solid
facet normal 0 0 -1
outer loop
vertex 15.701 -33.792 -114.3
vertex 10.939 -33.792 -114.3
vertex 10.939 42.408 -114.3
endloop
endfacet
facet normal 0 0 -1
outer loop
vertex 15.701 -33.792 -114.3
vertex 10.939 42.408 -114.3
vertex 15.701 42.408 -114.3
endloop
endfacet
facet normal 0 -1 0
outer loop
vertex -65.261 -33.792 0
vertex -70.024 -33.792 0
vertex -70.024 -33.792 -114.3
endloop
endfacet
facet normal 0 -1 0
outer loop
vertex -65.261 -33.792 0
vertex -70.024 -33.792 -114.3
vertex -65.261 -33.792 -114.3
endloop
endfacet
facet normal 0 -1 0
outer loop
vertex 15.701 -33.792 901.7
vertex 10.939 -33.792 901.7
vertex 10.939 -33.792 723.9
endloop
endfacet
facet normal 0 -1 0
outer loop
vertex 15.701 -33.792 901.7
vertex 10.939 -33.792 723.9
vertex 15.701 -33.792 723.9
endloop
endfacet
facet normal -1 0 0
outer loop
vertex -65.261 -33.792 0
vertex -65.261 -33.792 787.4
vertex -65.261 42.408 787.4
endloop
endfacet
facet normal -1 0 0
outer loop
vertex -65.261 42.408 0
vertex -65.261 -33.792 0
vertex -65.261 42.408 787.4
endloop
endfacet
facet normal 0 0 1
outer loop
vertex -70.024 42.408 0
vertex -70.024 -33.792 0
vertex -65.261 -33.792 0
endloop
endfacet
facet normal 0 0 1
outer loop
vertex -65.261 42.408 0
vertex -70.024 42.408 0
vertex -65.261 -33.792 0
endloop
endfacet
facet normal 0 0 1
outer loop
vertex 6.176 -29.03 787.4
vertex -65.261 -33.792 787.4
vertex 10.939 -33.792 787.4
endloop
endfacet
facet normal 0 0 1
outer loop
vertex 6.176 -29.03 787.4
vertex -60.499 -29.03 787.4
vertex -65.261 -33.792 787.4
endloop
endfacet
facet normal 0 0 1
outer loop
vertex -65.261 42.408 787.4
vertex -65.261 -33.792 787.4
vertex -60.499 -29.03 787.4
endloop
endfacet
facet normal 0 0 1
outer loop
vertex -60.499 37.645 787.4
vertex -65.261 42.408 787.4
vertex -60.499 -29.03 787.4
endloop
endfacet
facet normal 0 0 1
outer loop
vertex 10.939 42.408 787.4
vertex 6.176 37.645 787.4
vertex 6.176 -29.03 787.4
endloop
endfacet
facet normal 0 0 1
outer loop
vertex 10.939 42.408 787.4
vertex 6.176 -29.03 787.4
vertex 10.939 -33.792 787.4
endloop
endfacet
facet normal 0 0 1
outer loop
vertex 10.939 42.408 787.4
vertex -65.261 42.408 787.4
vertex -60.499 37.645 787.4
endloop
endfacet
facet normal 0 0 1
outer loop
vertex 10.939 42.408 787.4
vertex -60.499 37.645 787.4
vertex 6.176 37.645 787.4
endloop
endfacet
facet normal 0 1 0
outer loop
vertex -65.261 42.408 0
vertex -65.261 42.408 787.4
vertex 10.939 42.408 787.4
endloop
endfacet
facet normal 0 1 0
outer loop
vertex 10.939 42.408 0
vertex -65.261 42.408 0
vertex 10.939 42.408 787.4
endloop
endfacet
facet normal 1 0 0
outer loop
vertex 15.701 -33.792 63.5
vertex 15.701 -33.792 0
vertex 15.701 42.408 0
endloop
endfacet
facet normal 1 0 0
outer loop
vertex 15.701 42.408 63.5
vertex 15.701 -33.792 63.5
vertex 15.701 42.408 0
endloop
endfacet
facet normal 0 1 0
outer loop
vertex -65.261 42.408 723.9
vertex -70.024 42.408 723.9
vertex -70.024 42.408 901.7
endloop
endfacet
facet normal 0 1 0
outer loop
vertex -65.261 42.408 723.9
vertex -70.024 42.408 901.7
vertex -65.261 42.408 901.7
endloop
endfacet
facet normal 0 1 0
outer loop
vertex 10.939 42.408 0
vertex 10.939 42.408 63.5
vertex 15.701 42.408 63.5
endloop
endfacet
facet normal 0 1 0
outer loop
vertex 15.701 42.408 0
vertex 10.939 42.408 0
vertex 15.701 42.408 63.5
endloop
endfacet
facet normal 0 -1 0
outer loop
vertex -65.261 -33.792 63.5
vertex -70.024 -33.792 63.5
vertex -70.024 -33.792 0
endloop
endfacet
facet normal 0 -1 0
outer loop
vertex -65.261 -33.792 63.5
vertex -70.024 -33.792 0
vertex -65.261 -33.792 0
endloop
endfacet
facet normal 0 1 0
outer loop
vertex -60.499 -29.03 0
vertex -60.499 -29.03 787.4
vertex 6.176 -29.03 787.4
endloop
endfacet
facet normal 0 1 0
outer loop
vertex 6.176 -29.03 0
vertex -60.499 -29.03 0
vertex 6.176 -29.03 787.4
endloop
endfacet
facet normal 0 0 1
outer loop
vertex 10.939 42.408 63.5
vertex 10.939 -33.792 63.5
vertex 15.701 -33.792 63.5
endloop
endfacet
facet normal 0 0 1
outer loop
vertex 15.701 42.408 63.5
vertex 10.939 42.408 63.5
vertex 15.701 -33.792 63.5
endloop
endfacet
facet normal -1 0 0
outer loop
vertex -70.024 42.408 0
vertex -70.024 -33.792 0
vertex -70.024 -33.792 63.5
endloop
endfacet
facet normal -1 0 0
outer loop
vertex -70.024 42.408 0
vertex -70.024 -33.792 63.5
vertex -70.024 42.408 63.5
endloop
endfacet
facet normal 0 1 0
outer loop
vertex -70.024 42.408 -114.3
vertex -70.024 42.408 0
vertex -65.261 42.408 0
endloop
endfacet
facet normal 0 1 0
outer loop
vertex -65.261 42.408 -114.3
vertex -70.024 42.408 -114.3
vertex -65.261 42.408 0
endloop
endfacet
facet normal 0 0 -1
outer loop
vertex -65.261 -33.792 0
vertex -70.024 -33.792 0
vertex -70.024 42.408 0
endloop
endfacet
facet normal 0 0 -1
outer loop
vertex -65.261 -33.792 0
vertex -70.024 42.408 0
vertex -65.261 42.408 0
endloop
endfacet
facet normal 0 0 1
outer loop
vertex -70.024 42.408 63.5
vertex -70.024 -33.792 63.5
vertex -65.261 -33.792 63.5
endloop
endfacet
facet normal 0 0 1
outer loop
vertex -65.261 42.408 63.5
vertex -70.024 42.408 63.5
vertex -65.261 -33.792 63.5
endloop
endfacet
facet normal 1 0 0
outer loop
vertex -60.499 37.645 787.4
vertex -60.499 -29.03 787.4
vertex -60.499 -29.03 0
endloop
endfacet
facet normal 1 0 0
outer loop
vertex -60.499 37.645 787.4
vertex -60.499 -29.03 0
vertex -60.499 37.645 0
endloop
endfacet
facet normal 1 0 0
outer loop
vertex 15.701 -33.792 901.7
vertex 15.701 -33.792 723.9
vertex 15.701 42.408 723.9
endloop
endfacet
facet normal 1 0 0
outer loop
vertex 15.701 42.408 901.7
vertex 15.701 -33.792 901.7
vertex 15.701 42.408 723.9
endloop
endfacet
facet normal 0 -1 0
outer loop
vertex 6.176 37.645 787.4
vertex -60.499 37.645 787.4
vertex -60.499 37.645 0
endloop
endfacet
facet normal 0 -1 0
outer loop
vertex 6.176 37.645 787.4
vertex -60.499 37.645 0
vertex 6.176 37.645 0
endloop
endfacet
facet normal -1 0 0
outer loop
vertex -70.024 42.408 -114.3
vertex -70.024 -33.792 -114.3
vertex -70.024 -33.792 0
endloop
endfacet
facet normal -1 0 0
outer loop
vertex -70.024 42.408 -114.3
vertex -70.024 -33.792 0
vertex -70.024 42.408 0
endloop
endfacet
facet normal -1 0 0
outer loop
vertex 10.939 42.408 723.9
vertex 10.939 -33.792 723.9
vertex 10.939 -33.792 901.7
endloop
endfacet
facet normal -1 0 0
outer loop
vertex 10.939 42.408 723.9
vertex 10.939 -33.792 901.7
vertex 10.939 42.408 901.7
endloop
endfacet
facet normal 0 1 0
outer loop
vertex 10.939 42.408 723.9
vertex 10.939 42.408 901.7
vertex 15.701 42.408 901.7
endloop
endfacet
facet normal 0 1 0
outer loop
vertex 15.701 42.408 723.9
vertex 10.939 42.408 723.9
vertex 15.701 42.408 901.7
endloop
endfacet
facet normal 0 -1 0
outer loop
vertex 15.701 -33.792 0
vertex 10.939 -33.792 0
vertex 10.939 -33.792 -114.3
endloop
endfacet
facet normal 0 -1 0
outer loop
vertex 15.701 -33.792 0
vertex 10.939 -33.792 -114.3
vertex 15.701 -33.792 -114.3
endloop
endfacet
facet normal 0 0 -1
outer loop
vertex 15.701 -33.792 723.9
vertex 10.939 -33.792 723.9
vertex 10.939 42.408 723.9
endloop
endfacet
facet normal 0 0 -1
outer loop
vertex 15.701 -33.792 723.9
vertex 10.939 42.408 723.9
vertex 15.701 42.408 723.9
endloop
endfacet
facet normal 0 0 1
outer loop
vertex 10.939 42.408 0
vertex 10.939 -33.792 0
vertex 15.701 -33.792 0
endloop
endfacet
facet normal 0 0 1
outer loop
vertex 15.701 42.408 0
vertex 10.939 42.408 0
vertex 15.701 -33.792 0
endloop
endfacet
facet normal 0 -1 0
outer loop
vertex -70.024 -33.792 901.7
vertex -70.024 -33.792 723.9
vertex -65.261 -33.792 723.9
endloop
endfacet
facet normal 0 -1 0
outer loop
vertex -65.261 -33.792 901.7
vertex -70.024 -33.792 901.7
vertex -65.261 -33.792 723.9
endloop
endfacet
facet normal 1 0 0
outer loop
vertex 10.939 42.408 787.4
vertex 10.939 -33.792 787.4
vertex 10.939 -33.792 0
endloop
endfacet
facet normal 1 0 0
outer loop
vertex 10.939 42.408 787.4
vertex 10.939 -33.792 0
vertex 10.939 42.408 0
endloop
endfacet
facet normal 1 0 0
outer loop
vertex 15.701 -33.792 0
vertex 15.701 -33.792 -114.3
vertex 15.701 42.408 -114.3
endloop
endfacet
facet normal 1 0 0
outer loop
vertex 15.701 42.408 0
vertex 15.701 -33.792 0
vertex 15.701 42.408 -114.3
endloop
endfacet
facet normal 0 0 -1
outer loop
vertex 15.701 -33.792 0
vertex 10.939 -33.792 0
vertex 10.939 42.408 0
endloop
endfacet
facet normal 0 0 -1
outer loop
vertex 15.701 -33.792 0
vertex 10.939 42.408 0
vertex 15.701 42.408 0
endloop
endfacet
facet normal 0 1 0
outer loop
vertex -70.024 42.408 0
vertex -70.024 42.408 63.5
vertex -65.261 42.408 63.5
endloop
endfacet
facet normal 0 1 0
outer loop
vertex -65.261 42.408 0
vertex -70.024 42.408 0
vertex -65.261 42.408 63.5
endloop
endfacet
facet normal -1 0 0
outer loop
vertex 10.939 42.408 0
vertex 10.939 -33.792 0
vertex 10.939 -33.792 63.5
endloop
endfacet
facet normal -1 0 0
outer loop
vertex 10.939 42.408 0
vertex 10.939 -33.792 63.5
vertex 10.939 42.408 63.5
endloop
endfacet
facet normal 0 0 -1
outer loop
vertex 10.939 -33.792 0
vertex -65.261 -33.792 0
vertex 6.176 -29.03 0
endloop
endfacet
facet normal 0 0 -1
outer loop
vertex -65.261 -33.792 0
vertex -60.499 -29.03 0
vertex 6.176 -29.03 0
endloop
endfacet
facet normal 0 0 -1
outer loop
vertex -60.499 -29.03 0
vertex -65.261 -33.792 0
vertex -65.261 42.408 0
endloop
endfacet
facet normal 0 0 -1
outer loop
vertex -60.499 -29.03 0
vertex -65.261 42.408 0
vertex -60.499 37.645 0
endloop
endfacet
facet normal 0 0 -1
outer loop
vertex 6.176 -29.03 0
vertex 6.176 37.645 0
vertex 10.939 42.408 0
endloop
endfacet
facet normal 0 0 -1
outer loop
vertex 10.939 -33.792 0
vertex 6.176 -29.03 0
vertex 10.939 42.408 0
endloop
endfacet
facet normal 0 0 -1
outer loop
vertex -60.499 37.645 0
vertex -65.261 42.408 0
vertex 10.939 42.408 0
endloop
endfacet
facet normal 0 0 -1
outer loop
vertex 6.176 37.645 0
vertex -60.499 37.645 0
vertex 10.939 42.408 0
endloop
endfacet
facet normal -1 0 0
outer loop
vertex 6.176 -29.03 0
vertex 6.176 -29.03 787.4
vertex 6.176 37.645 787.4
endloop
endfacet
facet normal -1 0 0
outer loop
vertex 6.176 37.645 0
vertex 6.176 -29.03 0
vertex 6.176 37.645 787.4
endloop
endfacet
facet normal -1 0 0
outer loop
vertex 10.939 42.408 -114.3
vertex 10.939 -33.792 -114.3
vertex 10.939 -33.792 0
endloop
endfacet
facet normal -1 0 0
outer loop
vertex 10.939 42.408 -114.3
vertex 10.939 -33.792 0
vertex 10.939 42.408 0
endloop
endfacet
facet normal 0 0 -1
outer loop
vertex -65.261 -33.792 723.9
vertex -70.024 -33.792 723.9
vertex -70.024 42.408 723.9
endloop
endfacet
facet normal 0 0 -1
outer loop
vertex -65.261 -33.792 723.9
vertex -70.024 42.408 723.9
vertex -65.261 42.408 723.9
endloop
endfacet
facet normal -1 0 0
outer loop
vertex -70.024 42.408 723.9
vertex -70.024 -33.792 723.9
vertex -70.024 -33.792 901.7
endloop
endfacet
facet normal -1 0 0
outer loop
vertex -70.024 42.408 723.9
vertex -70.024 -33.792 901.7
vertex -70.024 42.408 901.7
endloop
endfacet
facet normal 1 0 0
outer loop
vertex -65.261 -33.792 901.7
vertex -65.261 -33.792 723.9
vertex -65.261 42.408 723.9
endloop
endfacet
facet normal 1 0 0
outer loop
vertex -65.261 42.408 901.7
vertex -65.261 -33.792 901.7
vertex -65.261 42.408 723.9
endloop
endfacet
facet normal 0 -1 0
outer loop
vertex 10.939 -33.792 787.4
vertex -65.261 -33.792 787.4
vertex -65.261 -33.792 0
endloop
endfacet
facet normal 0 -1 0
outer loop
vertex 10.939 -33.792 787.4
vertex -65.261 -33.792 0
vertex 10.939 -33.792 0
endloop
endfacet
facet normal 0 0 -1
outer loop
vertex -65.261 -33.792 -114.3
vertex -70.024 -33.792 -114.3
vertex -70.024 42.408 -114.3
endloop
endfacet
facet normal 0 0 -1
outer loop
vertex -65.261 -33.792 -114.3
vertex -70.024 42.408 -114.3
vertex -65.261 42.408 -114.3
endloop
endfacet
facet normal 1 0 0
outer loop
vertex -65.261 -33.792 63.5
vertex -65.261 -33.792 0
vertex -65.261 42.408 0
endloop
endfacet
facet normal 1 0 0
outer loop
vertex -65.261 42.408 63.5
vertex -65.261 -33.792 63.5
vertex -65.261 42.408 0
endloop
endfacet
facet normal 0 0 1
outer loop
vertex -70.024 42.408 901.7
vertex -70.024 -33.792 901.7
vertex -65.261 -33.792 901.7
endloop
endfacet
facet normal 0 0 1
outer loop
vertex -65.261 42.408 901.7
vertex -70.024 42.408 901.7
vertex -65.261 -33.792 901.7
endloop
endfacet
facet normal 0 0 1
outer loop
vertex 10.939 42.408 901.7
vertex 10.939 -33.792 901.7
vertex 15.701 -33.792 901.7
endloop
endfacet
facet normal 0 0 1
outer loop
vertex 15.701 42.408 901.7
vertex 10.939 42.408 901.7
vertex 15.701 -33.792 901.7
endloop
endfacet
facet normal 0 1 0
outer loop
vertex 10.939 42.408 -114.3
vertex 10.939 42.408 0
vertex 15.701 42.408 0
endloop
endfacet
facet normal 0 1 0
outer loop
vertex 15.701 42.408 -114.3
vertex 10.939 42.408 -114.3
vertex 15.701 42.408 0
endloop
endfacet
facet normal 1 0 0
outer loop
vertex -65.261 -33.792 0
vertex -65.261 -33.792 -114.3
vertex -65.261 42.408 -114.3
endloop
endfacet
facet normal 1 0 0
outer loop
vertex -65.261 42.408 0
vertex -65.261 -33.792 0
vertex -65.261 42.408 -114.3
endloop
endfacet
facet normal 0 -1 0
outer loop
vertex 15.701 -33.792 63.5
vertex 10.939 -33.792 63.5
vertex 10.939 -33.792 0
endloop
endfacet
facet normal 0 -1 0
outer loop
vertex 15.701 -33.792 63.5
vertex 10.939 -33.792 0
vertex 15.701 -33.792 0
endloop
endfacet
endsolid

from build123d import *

# Parameters (mm, degrees)
F0_W     = 76.2
F0_H     = 76.2
F0_W_2   = 66.675
F0_H_2   = 66.675
F1_DEPTH = 787.4
F0_W_3   = 4.7625
F3_DEPTH = 114.3
F4_DEPTH = 901.7
F2_DEPTH = 723.9
F5_DEPTH = 63.5


with BuildPart() as f1:
    # F0 (on Top) → F1 (new body)
    with BuildSketch(Plane.XY):
        with Locations((-27.161424, 4.307747)):
            Rectangle(F0_W, F0_H)
        with Locations((-27.161424, 4.307747)):
            Rectangle(F0_W_2, F0_H_2, mode=Mode.SUBTRACT)
    extrude(amount=F1_DEPTH)


with BuildPart() as f3:
    # F0 (on Top) → F3 (new body)
    with BuildSketch(Plane.XY):
        with Locations((13.319826, 4.307747)):
            Rectangle(F0_W_3, F0_H)
        with Locations((-67.642674, 4.307747)):
            Rectangle(F0_W_3, F0_H)
    extrude(amount=-F3_DEPTH)


with BuildPart() as f4:
    # F0 (on Top) → F4 (new body)
    with BuildSketch(Plane.XY):
        with Locations((13.319826, 4.307747)):
            Rectangle(F0_W_3, F0_H)
        with Locations((-67.642674, 4.307747)):
            Rectangle(F0_W_3, F0_H)
    extrude(amount=F4_DEPTH)

    # F0 (on Top) → F2 (cut)
    with BuildSketch(Plane.XY):
        with Locations((13.319826, 4.307747)):
            Rectangle(F0_W_3, F0_H)
        with Locations((-67.642674, 4.307747)):
            Rectangle(F0_W_3, F0_H)
    extrude(amount=F2_DEPTH, mode=Mode.SUBTRACT)


with BuildPart() as f5:
    # F0 (on Top) → F5 (new body)
    with BuildSketch(Plane.XY):
        with Locations((13.319826, 4.307747)):
            Rectangle(F0_W_3, F0_H)
        with Locations((-67.642674, 4.307747)):
            Rectangle(F0_W_3, F0_H)
    extrude(amount=F5_DEPTH)


solid = Compound([f1.part, f3.part, f4.part, f5.part])
